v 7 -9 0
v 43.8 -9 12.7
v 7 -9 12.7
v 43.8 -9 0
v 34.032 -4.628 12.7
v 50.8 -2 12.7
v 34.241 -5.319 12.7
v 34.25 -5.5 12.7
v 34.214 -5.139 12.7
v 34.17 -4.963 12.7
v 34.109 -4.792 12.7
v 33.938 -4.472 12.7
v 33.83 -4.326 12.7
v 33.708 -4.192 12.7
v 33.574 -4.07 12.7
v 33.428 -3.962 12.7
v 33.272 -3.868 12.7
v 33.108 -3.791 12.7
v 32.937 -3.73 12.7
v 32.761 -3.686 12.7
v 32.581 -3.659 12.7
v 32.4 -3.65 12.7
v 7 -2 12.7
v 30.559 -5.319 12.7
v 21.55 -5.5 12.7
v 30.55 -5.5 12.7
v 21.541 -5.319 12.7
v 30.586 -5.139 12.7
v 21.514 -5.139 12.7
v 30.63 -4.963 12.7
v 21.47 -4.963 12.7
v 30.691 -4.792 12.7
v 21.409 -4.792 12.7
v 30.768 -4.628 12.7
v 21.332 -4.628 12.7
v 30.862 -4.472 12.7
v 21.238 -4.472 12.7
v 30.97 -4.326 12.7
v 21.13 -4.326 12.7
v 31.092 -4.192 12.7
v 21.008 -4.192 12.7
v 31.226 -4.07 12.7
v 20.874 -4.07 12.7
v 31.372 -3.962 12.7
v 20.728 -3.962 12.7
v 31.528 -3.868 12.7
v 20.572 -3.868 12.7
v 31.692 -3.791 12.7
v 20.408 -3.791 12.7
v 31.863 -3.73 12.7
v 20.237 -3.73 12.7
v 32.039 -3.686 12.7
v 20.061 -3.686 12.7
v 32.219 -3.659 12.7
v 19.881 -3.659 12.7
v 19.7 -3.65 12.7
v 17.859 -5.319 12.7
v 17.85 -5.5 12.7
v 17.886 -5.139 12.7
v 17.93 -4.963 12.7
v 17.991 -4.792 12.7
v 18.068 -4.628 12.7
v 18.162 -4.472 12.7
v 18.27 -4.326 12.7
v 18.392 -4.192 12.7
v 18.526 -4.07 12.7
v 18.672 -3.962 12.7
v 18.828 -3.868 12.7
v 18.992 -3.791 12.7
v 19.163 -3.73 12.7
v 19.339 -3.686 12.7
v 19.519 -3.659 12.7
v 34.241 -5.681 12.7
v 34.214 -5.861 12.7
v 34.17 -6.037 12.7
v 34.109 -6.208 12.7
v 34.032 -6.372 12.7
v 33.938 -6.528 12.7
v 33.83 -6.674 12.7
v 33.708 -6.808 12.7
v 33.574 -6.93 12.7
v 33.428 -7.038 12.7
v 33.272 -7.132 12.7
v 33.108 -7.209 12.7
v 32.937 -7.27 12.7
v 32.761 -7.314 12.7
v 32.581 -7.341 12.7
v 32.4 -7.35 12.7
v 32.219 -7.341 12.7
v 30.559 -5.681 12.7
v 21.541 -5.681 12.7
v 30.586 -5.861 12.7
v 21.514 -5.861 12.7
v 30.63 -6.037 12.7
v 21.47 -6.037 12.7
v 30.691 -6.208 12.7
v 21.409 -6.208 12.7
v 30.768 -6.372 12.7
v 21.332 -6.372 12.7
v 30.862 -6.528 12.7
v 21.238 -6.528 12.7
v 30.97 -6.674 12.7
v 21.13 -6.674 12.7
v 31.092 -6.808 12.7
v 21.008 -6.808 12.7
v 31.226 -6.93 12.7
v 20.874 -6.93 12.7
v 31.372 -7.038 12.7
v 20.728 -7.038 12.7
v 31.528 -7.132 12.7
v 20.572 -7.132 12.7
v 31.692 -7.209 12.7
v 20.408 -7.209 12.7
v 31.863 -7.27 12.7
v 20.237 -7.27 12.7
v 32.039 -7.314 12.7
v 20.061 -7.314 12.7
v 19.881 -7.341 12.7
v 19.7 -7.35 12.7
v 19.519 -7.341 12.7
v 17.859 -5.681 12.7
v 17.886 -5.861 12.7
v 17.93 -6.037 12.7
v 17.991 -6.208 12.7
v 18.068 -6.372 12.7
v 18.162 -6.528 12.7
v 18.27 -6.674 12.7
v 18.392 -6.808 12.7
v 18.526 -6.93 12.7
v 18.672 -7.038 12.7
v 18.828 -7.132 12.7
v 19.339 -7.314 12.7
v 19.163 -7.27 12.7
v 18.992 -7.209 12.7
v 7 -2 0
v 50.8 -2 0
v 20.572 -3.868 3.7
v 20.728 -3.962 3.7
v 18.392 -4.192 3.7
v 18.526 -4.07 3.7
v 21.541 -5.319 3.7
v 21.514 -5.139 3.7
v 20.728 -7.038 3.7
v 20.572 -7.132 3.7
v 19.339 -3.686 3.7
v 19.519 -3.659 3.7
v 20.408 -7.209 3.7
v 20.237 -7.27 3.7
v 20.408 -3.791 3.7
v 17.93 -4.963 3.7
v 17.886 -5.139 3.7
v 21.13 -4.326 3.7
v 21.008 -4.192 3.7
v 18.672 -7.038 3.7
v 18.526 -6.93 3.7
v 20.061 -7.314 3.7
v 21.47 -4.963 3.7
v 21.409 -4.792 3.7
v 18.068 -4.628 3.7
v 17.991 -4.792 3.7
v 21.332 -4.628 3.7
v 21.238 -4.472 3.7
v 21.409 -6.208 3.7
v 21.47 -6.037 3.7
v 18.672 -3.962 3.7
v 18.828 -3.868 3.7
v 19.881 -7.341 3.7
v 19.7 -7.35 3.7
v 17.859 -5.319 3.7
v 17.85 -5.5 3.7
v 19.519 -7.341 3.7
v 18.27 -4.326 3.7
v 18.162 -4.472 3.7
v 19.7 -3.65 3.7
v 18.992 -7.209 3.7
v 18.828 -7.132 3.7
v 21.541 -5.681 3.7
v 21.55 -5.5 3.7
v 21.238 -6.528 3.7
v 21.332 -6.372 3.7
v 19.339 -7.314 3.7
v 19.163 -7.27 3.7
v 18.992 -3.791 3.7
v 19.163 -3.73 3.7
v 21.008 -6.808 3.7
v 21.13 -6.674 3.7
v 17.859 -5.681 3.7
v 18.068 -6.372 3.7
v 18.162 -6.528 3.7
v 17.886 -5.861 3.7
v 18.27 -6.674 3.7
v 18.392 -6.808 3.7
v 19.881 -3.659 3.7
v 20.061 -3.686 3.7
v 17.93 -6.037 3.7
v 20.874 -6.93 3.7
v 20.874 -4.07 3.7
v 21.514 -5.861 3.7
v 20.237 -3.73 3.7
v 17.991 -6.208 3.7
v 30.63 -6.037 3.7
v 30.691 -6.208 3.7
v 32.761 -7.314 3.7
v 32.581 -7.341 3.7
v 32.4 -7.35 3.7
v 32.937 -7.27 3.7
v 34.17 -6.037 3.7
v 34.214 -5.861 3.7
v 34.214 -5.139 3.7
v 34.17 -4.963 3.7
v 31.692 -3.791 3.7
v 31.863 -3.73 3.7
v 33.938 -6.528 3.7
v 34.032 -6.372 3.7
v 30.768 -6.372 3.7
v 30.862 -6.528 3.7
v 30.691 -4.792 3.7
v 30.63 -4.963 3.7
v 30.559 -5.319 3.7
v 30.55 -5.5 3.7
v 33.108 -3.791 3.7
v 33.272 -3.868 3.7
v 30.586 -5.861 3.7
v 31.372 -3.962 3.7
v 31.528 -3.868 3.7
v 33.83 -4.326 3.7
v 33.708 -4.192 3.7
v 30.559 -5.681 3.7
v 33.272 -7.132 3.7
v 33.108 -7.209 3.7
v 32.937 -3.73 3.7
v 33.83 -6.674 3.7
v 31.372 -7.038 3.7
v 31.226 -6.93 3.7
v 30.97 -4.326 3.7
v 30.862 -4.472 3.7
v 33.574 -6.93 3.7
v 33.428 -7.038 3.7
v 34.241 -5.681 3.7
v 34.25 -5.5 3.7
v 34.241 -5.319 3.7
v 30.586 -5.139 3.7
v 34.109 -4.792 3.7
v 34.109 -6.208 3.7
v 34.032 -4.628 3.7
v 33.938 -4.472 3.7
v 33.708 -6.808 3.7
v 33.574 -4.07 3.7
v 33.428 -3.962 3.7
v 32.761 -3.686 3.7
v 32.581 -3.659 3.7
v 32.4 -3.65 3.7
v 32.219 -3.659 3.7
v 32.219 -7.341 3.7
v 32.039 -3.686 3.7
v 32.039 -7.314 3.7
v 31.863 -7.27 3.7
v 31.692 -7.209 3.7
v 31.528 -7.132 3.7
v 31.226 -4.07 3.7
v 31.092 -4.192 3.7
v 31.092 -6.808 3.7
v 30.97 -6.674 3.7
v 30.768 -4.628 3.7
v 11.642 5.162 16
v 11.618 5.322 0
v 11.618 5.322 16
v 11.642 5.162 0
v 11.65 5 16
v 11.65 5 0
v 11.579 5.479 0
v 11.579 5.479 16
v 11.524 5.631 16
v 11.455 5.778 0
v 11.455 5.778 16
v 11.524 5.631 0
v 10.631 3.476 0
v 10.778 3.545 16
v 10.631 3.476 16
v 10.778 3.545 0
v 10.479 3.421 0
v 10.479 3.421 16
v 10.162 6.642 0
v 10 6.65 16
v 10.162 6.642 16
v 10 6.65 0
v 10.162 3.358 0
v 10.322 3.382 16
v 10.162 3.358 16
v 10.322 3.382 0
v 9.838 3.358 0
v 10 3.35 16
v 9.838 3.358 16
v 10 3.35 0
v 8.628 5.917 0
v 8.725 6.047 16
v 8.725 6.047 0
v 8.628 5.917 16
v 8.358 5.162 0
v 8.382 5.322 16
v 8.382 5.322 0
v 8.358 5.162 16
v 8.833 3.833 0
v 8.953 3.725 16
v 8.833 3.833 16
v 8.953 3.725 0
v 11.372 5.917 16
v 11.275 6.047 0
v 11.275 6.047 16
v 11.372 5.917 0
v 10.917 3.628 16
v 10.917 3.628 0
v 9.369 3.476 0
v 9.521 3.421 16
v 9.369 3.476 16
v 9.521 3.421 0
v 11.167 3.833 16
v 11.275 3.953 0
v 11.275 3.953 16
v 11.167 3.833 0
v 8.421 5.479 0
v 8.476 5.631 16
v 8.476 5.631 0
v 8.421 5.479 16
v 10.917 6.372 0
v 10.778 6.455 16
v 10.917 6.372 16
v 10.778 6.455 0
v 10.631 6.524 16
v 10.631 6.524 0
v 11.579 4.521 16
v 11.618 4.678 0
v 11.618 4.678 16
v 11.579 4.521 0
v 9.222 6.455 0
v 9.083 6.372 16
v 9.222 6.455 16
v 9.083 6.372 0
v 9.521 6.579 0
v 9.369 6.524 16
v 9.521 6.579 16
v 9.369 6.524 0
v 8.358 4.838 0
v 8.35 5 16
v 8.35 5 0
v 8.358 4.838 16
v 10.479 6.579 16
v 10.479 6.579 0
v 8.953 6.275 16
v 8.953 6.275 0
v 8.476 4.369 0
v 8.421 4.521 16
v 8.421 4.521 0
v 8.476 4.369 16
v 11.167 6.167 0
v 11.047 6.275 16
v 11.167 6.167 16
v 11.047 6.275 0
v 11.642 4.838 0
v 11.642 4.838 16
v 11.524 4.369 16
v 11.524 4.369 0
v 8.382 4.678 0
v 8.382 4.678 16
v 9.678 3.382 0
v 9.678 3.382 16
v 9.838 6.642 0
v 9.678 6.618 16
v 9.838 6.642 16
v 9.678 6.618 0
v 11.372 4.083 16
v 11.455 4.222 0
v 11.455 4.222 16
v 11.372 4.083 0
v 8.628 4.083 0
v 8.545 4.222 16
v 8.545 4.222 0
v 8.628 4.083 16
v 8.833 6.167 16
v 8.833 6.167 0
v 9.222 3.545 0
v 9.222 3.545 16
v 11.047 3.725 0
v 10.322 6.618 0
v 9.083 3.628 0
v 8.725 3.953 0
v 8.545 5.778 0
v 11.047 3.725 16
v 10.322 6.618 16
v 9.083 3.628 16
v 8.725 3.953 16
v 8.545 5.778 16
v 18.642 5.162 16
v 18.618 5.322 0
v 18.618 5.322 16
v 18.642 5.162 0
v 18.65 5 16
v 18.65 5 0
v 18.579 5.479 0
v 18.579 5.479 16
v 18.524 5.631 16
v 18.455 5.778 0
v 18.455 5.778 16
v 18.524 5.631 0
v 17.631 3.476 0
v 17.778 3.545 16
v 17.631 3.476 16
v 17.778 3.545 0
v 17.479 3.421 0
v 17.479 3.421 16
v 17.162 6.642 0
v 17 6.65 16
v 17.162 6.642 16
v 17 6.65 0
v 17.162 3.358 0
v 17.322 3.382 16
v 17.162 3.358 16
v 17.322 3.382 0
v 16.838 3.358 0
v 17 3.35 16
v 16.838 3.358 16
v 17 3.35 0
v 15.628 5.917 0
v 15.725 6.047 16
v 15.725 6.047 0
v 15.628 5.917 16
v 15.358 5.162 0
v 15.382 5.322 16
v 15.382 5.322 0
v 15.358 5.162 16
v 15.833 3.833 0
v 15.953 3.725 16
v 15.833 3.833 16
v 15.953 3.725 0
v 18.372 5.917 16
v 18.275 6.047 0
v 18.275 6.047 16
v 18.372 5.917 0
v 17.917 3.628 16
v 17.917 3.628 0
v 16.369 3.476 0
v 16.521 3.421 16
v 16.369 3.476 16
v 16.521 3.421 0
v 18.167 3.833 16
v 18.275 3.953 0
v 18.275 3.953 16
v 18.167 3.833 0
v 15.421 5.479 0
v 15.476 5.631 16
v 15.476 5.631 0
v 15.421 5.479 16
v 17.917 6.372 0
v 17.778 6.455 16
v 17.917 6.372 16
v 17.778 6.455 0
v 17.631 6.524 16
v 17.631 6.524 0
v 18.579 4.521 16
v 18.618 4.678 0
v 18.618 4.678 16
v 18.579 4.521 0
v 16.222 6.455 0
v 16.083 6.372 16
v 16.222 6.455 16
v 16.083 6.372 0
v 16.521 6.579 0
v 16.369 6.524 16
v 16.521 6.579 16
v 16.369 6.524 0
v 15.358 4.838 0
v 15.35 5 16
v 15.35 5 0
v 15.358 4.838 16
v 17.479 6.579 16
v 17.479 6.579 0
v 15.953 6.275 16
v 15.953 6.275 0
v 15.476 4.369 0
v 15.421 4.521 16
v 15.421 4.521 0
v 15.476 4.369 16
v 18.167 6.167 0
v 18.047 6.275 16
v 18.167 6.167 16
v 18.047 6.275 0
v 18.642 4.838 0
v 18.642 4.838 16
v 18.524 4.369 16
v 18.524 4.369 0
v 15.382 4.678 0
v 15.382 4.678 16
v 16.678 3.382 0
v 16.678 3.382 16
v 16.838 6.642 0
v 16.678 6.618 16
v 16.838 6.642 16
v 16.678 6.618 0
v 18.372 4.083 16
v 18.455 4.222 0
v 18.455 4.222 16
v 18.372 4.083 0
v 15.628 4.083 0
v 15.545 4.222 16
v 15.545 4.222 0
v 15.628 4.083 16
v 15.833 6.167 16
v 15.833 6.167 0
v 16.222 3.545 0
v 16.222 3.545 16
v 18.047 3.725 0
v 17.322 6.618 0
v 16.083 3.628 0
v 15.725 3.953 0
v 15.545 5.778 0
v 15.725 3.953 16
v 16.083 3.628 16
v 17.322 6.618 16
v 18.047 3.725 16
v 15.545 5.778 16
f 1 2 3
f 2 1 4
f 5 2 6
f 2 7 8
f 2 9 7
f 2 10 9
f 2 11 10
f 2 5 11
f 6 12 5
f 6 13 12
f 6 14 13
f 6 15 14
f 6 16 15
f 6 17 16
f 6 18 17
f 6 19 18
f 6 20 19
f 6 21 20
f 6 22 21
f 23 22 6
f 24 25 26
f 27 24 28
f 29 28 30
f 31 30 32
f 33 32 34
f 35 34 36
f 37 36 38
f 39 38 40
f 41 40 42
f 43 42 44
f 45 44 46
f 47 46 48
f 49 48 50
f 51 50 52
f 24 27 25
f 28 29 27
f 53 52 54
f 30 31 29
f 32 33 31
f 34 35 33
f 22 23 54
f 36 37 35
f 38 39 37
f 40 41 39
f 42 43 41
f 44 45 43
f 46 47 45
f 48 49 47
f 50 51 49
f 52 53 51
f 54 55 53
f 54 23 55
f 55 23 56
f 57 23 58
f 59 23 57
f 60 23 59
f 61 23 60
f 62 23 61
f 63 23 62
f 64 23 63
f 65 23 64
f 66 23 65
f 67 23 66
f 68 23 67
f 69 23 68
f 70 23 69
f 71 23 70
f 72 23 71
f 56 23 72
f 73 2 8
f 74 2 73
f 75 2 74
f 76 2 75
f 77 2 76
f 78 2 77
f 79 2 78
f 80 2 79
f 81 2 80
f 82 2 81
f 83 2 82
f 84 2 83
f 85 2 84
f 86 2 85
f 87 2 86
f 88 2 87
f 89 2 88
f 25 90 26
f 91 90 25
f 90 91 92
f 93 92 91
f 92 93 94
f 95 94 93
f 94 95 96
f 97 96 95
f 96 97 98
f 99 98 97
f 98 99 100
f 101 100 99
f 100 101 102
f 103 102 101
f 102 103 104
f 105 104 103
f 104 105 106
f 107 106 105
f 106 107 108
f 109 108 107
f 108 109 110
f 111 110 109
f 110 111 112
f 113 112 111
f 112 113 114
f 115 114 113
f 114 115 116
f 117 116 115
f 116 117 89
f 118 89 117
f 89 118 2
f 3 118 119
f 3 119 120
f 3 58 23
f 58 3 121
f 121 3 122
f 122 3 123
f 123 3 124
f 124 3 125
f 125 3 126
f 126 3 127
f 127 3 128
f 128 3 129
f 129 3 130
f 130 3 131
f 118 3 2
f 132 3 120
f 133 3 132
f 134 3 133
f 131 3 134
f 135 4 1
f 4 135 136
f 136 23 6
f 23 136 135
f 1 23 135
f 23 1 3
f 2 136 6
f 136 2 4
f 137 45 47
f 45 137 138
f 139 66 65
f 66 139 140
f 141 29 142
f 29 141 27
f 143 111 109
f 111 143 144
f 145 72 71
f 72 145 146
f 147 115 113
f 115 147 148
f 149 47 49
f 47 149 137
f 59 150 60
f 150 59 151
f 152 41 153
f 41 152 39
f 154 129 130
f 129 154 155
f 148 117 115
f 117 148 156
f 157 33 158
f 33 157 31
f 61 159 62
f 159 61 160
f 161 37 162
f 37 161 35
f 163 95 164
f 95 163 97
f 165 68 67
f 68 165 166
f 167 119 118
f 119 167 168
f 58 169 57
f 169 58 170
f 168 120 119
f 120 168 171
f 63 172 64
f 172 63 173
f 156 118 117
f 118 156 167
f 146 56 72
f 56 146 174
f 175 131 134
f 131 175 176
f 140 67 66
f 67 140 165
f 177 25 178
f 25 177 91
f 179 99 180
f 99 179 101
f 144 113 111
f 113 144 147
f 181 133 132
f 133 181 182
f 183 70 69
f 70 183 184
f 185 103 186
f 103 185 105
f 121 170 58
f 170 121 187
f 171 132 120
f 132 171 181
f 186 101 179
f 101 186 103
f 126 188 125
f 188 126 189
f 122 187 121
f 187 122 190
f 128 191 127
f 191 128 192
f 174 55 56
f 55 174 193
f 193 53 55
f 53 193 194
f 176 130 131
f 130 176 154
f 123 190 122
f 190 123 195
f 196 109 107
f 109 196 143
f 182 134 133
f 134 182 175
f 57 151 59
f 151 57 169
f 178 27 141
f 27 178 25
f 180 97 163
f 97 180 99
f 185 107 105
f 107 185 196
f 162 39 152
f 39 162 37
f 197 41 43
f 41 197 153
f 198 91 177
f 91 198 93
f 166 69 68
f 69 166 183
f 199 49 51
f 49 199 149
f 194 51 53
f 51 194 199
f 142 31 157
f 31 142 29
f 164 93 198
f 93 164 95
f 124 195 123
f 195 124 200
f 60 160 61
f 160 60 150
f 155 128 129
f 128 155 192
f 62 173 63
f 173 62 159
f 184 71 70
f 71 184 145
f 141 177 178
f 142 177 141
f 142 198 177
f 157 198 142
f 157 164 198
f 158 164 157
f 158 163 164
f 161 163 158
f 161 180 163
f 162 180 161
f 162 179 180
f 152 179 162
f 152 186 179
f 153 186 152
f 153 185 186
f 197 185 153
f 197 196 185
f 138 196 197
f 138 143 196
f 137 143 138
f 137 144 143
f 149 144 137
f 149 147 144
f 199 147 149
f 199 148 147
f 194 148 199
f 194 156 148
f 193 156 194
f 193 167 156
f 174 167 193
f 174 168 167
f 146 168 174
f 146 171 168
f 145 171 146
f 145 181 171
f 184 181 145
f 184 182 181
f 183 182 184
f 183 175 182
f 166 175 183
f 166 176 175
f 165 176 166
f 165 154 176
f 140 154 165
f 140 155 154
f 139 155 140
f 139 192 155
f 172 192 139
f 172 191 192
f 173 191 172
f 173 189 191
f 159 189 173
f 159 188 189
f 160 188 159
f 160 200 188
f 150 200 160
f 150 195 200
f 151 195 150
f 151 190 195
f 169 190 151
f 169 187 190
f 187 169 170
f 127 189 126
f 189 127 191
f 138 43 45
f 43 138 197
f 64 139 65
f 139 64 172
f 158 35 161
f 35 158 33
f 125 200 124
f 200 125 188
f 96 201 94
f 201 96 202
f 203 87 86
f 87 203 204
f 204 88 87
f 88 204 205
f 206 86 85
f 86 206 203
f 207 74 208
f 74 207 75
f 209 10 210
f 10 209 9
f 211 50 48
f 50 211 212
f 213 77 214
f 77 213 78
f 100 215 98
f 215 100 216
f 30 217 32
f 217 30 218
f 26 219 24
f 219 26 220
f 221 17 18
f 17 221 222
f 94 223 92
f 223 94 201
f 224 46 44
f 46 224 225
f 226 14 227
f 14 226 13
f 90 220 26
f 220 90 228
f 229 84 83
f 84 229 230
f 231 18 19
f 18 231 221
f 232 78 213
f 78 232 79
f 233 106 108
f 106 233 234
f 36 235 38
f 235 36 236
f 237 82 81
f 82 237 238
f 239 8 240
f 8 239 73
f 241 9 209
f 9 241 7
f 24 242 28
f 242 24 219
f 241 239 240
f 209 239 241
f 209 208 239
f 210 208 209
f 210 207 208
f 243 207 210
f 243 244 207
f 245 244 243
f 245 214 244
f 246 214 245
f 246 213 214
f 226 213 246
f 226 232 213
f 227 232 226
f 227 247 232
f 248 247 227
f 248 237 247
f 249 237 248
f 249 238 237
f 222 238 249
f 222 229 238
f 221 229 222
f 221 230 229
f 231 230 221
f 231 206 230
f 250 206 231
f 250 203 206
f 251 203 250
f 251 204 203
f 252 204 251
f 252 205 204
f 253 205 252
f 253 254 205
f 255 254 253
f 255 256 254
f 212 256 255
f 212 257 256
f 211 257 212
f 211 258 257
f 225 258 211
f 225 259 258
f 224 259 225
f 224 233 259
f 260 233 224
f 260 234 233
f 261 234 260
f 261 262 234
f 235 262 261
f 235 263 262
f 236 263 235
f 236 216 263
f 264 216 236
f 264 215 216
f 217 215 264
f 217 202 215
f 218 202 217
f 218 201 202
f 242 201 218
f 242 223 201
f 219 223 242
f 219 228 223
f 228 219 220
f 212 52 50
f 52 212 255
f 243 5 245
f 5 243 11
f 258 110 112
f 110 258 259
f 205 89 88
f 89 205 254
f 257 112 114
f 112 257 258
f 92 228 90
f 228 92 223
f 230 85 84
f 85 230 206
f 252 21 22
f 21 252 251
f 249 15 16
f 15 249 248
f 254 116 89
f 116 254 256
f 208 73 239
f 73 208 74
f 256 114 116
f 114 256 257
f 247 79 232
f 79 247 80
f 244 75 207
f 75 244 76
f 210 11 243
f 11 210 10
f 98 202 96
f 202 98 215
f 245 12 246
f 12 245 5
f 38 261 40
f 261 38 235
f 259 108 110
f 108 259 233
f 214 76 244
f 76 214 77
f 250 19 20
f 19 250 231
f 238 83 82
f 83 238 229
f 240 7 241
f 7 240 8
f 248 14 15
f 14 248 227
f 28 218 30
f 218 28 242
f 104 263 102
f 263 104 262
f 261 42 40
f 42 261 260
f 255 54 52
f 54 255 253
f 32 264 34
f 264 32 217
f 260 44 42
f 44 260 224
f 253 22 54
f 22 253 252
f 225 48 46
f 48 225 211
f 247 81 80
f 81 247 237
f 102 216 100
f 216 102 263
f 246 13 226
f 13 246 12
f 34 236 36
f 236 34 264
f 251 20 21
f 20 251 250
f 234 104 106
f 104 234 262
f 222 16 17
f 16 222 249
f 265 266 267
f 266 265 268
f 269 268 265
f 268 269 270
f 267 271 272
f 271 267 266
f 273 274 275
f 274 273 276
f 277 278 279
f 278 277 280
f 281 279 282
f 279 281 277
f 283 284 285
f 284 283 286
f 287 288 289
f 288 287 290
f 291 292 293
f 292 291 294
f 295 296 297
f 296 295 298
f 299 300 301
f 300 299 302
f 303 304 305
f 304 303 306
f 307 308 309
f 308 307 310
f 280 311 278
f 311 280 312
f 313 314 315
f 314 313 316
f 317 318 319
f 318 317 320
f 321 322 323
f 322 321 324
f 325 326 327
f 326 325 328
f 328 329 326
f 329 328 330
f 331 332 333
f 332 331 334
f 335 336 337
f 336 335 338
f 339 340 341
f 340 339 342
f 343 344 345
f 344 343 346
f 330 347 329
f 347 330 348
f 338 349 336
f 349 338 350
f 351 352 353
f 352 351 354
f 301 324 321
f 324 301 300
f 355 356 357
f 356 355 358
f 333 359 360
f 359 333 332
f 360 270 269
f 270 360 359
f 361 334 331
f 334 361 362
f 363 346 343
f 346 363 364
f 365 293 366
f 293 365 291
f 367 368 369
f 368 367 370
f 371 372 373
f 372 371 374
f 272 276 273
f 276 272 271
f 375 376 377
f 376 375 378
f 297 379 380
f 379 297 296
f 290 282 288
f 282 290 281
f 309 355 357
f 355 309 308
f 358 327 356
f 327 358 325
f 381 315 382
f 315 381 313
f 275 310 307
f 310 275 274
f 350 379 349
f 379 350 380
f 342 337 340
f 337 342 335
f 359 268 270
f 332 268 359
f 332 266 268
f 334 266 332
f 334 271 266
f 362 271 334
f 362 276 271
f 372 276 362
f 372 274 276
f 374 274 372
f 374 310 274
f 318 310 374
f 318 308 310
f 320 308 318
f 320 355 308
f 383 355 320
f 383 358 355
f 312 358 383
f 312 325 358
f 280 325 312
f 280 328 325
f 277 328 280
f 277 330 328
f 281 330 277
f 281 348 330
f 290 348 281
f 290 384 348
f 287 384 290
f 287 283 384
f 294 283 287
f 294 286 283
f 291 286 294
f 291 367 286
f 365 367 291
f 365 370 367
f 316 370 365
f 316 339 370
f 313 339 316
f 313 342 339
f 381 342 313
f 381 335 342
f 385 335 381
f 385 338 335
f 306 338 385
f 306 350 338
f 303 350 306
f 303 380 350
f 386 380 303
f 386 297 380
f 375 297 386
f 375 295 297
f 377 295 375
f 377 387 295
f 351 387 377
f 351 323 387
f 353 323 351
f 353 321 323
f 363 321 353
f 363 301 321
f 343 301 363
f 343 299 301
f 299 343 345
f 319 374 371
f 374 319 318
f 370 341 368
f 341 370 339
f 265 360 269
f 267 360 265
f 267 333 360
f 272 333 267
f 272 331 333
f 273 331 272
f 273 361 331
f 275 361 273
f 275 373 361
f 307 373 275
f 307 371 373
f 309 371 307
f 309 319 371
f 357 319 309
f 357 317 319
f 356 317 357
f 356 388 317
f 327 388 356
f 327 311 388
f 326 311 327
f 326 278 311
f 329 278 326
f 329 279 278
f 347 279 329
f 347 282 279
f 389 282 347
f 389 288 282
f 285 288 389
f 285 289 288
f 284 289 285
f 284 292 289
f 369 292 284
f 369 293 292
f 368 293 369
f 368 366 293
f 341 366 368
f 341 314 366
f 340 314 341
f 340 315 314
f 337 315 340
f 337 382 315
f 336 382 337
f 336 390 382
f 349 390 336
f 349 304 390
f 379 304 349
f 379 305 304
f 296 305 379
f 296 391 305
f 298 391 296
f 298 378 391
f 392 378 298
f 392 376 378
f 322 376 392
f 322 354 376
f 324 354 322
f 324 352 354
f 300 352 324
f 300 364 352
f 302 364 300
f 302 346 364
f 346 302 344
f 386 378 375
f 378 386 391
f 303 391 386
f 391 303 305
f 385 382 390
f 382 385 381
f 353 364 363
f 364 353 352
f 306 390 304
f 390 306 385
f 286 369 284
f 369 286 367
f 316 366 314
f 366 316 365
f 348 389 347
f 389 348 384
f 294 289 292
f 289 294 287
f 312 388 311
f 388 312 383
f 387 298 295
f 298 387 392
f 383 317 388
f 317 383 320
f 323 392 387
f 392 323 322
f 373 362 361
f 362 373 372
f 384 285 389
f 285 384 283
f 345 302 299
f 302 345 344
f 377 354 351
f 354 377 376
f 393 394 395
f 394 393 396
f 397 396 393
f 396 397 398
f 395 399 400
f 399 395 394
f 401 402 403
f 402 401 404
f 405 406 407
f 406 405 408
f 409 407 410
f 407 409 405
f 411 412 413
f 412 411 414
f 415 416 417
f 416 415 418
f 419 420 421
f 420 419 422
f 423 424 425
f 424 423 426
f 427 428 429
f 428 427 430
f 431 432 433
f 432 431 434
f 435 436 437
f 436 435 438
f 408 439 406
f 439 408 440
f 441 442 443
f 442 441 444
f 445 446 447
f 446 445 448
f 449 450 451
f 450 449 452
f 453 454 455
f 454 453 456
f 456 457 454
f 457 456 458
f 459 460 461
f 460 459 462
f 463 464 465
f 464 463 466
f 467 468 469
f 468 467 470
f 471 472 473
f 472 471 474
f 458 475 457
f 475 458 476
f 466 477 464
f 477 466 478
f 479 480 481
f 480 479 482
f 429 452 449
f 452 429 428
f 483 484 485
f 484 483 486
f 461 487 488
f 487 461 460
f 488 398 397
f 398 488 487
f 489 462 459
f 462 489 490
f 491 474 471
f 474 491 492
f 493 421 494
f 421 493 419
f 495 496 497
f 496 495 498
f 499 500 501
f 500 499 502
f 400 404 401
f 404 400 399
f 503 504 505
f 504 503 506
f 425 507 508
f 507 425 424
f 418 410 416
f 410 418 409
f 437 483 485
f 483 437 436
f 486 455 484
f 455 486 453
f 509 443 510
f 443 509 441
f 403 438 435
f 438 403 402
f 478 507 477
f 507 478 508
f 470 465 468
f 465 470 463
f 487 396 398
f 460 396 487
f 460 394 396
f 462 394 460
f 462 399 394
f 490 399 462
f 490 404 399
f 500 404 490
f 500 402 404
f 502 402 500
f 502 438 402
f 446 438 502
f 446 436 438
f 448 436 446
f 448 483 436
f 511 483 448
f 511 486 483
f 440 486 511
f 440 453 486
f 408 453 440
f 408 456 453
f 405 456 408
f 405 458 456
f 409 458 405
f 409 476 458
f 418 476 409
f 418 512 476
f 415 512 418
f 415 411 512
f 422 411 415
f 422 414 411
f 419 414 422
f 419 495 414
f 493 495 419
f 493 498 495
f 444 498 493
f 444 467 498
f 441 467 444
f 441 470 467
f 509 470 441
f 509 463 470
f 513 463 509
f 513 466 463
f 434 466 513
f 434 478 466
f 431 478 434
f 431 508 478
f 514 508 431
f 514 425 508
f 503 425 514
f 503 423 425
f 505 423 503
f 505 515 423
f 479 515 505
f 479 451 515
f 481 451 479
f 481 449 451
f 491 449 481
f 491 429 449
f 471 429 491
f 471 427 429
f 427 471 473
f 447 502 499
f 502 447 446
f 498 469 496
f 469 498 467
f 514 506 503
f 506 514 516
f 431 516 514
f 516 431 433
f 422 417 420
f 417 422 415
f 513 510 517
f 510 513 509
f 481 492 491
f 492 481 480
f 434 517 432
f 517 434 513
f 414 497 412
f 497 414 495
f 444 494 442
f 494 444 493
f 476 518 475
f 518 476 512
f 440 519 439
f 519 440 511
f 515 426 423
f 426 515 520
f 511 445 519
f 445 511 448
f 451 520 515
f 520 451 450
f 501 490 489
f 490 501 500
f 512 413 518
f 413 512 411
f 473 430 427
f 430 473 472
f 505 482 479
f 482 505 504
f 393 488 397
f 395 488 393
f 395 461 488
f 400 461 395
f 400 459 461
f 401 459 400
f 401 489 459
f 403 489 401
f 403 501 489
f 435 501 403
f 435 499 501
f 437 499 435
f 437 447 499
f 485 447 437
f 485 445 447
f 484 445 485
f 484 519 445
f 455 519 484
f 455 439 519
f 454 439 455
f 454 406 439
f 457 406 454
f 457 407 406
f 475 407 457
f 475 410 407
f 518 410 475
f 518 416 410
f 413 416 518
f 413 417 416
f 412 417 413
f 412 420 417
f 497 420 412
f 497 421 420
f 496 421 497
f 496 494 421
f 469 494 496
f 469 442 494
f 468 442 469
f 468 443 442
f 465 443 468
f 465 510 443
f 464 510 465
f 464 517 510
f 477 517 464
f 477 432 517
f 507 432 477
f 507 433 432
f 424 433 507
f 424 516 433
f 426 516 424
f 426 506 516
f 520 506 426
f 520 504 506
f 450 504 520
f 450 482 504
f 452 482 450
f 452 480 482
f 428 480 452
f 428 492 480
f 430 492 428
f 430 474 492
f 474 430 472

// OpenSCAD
$fn=$preview ? 16 : 64;

inch=25.4; // Set to 1.0 if you're in inch-land
w=7;
l=5*inch;
h=inch/2;
hl=2*inch;
h2=inch/2;
pin_d=w/2;
pin_h=10;
clearance=0.2;
logotext="Ullevål kaffeslabberas";
logospacing=1.2;
xlogo=true;
ylogo=false;
font="Copperplate Normal";
fontsize=7;

test=true;

separatepins=true;

pinsonly=false;
pincount=6;
idiot=false;

if (idiot) { echo("IDIOT!!!!!!"); }

module logo() {
    rotate([90,0,0])
        linear_extrude(height=2)
            text(logotext, font=font, size=fontsize, spacing=logospacing);
}

module arm(length, height=h, up=0, cut_corners = 1, text=undef) {
    difference() {
        if (up)  {
            difference() {
                translate([0,w,0])
                    cube([w,length-w,height]);
                if (cut_corners)
                    translate([0,length,0])
                        rotate([0,0,-45])
                            cube([w*2,w*2,height]);
            }
        } else {
            difference() {
                translate([w,0,0])
                    cube([length-w,w,height]);
                if (cut_corners)
                    translate([length,0,0])
                        rotate([0,0,45])
                            cube([w*2,w*2,height]);
            }
        }
    }
}

module drawpins(count=1) {
    echo("PIN: cylinder(d=", pin_d-clearance, ", h=", (pin_h-2)*2, ")");
    for ( pin = [0 : count-1] ) {
        translate([pin_d*pin*2,0,0]) {
            if (idiot) {
                cylinder(d=pin_d-clearance/2, h=(pin_h-2));
                translate([0,0,pin_h-2])
                    cylinder(d=pin_d-clearance*3, h=(pin_h-2));
            } else {
                cylinder(d=pin_d-clearance, h=(pin_h-2)*2);
            }
        }
    }
}

if (test) {
    if (!separatepins) {
        translate([(test ? 0 : l-hl),0,test ? 0 : h])
            arm(hl, h2);
        translate([(test ? 0 : l-hl)+w+h,w/2,(test ? 0 : h)+h2])
            cylinder(d=pin_d-clearance, h=pin_h-1);
        translate([(test ? 0 : l-hl)+w+h*2,w/2,(test ? 0 : h)+h2])
            cylinder(d=pin_d-clearance, h=pin_h-1);
    }
    
    translate([0,test ? -2 : 0,0]) {
        rotate([0,0,test ? 270 : 0]) {
            difference() {
                translate([0,(test ? 0 : l-hl),test ? 0 : h])
                    arm(hl, h2, up=1);
                translate([w/2,(test ? 0 : l-hl)+w+h,(test ? 0 : h)+h2-pin_h+1])
                    cylinder(d=pin_d+clearance, h=pin_h+1);
                translate([w/2,(test ? 0 : l-hl)+w+h*2,(test ? 0 : h)+h2-pin_h+1])
                    cylinder(d=pin_d+clearance, h=pin_h+1);
            }
        }
    }
    if (separatepins) {
        translate([10,5,0])
            drawpins(count=2);
    }
} else if (pinsonly) {
    drawpins(count=pincount);
} else {
    // Corner
    difference() {
        translate([w,w,0])
            cylinder(d=w*2,h=h);
        translate([w*2,w*2,0])
            cylinder(d=w*2,h=h);
    }
    difference() {
        arm(l);
        if (xlogo)
            translate([10,2,3])
                logo();
    }

    if (separatepins) {
        echo("HOLE: cylinder(d=", pin_d+clearance, ", h=", pin_h+1);
        difference() {
            translate([l-hl,0,h])
                arm(hl, h2);
            translate([l-hl+w+h,w/2,h+h2-pin_h+1])
                cylinder(d=pin_d+clearance, h=pin_h+1);
            translate([l-hl+w+h*2,w/2,h+h2-pin_h+1])
                cylinder(d=pin_d+clearance, h=pin_h+1);
        }
        
        translate([20,20,0])
            drawpins(count=pincount);
    } else {
        translate([l-hl,0,h])
            arm(hl, h2);
        translate([l-hl+w+h,w/2,h+h2])
            cylinder(d=pin_d-clearance, h=pin_h-1);
        translate([l-hl+w+h*2,w/2,h+h2])
            cylinder(d=pin_d-clearance, h=pin_h-1);
    }

    difference() {
        arm(l, up=1);
        if (ylogo)
            rotate([0,0,270])
                translate([-125,2,3])
                    logo();
    }

    difference() {
        translate([0,l-hl,h])
            arm(hl, h2, up=1);
        translate([w/2,l-hl+w+h,h+h2-pin_h+1])
            cylinder(d=pin_d+clearance, h=pin_h+1);
        translate([w/2,l-hl+w+h*2,h+h2-pin_h+1])
            cylinder(d=pin_d+clearance, h=pin_h+1);
    }
}
//
